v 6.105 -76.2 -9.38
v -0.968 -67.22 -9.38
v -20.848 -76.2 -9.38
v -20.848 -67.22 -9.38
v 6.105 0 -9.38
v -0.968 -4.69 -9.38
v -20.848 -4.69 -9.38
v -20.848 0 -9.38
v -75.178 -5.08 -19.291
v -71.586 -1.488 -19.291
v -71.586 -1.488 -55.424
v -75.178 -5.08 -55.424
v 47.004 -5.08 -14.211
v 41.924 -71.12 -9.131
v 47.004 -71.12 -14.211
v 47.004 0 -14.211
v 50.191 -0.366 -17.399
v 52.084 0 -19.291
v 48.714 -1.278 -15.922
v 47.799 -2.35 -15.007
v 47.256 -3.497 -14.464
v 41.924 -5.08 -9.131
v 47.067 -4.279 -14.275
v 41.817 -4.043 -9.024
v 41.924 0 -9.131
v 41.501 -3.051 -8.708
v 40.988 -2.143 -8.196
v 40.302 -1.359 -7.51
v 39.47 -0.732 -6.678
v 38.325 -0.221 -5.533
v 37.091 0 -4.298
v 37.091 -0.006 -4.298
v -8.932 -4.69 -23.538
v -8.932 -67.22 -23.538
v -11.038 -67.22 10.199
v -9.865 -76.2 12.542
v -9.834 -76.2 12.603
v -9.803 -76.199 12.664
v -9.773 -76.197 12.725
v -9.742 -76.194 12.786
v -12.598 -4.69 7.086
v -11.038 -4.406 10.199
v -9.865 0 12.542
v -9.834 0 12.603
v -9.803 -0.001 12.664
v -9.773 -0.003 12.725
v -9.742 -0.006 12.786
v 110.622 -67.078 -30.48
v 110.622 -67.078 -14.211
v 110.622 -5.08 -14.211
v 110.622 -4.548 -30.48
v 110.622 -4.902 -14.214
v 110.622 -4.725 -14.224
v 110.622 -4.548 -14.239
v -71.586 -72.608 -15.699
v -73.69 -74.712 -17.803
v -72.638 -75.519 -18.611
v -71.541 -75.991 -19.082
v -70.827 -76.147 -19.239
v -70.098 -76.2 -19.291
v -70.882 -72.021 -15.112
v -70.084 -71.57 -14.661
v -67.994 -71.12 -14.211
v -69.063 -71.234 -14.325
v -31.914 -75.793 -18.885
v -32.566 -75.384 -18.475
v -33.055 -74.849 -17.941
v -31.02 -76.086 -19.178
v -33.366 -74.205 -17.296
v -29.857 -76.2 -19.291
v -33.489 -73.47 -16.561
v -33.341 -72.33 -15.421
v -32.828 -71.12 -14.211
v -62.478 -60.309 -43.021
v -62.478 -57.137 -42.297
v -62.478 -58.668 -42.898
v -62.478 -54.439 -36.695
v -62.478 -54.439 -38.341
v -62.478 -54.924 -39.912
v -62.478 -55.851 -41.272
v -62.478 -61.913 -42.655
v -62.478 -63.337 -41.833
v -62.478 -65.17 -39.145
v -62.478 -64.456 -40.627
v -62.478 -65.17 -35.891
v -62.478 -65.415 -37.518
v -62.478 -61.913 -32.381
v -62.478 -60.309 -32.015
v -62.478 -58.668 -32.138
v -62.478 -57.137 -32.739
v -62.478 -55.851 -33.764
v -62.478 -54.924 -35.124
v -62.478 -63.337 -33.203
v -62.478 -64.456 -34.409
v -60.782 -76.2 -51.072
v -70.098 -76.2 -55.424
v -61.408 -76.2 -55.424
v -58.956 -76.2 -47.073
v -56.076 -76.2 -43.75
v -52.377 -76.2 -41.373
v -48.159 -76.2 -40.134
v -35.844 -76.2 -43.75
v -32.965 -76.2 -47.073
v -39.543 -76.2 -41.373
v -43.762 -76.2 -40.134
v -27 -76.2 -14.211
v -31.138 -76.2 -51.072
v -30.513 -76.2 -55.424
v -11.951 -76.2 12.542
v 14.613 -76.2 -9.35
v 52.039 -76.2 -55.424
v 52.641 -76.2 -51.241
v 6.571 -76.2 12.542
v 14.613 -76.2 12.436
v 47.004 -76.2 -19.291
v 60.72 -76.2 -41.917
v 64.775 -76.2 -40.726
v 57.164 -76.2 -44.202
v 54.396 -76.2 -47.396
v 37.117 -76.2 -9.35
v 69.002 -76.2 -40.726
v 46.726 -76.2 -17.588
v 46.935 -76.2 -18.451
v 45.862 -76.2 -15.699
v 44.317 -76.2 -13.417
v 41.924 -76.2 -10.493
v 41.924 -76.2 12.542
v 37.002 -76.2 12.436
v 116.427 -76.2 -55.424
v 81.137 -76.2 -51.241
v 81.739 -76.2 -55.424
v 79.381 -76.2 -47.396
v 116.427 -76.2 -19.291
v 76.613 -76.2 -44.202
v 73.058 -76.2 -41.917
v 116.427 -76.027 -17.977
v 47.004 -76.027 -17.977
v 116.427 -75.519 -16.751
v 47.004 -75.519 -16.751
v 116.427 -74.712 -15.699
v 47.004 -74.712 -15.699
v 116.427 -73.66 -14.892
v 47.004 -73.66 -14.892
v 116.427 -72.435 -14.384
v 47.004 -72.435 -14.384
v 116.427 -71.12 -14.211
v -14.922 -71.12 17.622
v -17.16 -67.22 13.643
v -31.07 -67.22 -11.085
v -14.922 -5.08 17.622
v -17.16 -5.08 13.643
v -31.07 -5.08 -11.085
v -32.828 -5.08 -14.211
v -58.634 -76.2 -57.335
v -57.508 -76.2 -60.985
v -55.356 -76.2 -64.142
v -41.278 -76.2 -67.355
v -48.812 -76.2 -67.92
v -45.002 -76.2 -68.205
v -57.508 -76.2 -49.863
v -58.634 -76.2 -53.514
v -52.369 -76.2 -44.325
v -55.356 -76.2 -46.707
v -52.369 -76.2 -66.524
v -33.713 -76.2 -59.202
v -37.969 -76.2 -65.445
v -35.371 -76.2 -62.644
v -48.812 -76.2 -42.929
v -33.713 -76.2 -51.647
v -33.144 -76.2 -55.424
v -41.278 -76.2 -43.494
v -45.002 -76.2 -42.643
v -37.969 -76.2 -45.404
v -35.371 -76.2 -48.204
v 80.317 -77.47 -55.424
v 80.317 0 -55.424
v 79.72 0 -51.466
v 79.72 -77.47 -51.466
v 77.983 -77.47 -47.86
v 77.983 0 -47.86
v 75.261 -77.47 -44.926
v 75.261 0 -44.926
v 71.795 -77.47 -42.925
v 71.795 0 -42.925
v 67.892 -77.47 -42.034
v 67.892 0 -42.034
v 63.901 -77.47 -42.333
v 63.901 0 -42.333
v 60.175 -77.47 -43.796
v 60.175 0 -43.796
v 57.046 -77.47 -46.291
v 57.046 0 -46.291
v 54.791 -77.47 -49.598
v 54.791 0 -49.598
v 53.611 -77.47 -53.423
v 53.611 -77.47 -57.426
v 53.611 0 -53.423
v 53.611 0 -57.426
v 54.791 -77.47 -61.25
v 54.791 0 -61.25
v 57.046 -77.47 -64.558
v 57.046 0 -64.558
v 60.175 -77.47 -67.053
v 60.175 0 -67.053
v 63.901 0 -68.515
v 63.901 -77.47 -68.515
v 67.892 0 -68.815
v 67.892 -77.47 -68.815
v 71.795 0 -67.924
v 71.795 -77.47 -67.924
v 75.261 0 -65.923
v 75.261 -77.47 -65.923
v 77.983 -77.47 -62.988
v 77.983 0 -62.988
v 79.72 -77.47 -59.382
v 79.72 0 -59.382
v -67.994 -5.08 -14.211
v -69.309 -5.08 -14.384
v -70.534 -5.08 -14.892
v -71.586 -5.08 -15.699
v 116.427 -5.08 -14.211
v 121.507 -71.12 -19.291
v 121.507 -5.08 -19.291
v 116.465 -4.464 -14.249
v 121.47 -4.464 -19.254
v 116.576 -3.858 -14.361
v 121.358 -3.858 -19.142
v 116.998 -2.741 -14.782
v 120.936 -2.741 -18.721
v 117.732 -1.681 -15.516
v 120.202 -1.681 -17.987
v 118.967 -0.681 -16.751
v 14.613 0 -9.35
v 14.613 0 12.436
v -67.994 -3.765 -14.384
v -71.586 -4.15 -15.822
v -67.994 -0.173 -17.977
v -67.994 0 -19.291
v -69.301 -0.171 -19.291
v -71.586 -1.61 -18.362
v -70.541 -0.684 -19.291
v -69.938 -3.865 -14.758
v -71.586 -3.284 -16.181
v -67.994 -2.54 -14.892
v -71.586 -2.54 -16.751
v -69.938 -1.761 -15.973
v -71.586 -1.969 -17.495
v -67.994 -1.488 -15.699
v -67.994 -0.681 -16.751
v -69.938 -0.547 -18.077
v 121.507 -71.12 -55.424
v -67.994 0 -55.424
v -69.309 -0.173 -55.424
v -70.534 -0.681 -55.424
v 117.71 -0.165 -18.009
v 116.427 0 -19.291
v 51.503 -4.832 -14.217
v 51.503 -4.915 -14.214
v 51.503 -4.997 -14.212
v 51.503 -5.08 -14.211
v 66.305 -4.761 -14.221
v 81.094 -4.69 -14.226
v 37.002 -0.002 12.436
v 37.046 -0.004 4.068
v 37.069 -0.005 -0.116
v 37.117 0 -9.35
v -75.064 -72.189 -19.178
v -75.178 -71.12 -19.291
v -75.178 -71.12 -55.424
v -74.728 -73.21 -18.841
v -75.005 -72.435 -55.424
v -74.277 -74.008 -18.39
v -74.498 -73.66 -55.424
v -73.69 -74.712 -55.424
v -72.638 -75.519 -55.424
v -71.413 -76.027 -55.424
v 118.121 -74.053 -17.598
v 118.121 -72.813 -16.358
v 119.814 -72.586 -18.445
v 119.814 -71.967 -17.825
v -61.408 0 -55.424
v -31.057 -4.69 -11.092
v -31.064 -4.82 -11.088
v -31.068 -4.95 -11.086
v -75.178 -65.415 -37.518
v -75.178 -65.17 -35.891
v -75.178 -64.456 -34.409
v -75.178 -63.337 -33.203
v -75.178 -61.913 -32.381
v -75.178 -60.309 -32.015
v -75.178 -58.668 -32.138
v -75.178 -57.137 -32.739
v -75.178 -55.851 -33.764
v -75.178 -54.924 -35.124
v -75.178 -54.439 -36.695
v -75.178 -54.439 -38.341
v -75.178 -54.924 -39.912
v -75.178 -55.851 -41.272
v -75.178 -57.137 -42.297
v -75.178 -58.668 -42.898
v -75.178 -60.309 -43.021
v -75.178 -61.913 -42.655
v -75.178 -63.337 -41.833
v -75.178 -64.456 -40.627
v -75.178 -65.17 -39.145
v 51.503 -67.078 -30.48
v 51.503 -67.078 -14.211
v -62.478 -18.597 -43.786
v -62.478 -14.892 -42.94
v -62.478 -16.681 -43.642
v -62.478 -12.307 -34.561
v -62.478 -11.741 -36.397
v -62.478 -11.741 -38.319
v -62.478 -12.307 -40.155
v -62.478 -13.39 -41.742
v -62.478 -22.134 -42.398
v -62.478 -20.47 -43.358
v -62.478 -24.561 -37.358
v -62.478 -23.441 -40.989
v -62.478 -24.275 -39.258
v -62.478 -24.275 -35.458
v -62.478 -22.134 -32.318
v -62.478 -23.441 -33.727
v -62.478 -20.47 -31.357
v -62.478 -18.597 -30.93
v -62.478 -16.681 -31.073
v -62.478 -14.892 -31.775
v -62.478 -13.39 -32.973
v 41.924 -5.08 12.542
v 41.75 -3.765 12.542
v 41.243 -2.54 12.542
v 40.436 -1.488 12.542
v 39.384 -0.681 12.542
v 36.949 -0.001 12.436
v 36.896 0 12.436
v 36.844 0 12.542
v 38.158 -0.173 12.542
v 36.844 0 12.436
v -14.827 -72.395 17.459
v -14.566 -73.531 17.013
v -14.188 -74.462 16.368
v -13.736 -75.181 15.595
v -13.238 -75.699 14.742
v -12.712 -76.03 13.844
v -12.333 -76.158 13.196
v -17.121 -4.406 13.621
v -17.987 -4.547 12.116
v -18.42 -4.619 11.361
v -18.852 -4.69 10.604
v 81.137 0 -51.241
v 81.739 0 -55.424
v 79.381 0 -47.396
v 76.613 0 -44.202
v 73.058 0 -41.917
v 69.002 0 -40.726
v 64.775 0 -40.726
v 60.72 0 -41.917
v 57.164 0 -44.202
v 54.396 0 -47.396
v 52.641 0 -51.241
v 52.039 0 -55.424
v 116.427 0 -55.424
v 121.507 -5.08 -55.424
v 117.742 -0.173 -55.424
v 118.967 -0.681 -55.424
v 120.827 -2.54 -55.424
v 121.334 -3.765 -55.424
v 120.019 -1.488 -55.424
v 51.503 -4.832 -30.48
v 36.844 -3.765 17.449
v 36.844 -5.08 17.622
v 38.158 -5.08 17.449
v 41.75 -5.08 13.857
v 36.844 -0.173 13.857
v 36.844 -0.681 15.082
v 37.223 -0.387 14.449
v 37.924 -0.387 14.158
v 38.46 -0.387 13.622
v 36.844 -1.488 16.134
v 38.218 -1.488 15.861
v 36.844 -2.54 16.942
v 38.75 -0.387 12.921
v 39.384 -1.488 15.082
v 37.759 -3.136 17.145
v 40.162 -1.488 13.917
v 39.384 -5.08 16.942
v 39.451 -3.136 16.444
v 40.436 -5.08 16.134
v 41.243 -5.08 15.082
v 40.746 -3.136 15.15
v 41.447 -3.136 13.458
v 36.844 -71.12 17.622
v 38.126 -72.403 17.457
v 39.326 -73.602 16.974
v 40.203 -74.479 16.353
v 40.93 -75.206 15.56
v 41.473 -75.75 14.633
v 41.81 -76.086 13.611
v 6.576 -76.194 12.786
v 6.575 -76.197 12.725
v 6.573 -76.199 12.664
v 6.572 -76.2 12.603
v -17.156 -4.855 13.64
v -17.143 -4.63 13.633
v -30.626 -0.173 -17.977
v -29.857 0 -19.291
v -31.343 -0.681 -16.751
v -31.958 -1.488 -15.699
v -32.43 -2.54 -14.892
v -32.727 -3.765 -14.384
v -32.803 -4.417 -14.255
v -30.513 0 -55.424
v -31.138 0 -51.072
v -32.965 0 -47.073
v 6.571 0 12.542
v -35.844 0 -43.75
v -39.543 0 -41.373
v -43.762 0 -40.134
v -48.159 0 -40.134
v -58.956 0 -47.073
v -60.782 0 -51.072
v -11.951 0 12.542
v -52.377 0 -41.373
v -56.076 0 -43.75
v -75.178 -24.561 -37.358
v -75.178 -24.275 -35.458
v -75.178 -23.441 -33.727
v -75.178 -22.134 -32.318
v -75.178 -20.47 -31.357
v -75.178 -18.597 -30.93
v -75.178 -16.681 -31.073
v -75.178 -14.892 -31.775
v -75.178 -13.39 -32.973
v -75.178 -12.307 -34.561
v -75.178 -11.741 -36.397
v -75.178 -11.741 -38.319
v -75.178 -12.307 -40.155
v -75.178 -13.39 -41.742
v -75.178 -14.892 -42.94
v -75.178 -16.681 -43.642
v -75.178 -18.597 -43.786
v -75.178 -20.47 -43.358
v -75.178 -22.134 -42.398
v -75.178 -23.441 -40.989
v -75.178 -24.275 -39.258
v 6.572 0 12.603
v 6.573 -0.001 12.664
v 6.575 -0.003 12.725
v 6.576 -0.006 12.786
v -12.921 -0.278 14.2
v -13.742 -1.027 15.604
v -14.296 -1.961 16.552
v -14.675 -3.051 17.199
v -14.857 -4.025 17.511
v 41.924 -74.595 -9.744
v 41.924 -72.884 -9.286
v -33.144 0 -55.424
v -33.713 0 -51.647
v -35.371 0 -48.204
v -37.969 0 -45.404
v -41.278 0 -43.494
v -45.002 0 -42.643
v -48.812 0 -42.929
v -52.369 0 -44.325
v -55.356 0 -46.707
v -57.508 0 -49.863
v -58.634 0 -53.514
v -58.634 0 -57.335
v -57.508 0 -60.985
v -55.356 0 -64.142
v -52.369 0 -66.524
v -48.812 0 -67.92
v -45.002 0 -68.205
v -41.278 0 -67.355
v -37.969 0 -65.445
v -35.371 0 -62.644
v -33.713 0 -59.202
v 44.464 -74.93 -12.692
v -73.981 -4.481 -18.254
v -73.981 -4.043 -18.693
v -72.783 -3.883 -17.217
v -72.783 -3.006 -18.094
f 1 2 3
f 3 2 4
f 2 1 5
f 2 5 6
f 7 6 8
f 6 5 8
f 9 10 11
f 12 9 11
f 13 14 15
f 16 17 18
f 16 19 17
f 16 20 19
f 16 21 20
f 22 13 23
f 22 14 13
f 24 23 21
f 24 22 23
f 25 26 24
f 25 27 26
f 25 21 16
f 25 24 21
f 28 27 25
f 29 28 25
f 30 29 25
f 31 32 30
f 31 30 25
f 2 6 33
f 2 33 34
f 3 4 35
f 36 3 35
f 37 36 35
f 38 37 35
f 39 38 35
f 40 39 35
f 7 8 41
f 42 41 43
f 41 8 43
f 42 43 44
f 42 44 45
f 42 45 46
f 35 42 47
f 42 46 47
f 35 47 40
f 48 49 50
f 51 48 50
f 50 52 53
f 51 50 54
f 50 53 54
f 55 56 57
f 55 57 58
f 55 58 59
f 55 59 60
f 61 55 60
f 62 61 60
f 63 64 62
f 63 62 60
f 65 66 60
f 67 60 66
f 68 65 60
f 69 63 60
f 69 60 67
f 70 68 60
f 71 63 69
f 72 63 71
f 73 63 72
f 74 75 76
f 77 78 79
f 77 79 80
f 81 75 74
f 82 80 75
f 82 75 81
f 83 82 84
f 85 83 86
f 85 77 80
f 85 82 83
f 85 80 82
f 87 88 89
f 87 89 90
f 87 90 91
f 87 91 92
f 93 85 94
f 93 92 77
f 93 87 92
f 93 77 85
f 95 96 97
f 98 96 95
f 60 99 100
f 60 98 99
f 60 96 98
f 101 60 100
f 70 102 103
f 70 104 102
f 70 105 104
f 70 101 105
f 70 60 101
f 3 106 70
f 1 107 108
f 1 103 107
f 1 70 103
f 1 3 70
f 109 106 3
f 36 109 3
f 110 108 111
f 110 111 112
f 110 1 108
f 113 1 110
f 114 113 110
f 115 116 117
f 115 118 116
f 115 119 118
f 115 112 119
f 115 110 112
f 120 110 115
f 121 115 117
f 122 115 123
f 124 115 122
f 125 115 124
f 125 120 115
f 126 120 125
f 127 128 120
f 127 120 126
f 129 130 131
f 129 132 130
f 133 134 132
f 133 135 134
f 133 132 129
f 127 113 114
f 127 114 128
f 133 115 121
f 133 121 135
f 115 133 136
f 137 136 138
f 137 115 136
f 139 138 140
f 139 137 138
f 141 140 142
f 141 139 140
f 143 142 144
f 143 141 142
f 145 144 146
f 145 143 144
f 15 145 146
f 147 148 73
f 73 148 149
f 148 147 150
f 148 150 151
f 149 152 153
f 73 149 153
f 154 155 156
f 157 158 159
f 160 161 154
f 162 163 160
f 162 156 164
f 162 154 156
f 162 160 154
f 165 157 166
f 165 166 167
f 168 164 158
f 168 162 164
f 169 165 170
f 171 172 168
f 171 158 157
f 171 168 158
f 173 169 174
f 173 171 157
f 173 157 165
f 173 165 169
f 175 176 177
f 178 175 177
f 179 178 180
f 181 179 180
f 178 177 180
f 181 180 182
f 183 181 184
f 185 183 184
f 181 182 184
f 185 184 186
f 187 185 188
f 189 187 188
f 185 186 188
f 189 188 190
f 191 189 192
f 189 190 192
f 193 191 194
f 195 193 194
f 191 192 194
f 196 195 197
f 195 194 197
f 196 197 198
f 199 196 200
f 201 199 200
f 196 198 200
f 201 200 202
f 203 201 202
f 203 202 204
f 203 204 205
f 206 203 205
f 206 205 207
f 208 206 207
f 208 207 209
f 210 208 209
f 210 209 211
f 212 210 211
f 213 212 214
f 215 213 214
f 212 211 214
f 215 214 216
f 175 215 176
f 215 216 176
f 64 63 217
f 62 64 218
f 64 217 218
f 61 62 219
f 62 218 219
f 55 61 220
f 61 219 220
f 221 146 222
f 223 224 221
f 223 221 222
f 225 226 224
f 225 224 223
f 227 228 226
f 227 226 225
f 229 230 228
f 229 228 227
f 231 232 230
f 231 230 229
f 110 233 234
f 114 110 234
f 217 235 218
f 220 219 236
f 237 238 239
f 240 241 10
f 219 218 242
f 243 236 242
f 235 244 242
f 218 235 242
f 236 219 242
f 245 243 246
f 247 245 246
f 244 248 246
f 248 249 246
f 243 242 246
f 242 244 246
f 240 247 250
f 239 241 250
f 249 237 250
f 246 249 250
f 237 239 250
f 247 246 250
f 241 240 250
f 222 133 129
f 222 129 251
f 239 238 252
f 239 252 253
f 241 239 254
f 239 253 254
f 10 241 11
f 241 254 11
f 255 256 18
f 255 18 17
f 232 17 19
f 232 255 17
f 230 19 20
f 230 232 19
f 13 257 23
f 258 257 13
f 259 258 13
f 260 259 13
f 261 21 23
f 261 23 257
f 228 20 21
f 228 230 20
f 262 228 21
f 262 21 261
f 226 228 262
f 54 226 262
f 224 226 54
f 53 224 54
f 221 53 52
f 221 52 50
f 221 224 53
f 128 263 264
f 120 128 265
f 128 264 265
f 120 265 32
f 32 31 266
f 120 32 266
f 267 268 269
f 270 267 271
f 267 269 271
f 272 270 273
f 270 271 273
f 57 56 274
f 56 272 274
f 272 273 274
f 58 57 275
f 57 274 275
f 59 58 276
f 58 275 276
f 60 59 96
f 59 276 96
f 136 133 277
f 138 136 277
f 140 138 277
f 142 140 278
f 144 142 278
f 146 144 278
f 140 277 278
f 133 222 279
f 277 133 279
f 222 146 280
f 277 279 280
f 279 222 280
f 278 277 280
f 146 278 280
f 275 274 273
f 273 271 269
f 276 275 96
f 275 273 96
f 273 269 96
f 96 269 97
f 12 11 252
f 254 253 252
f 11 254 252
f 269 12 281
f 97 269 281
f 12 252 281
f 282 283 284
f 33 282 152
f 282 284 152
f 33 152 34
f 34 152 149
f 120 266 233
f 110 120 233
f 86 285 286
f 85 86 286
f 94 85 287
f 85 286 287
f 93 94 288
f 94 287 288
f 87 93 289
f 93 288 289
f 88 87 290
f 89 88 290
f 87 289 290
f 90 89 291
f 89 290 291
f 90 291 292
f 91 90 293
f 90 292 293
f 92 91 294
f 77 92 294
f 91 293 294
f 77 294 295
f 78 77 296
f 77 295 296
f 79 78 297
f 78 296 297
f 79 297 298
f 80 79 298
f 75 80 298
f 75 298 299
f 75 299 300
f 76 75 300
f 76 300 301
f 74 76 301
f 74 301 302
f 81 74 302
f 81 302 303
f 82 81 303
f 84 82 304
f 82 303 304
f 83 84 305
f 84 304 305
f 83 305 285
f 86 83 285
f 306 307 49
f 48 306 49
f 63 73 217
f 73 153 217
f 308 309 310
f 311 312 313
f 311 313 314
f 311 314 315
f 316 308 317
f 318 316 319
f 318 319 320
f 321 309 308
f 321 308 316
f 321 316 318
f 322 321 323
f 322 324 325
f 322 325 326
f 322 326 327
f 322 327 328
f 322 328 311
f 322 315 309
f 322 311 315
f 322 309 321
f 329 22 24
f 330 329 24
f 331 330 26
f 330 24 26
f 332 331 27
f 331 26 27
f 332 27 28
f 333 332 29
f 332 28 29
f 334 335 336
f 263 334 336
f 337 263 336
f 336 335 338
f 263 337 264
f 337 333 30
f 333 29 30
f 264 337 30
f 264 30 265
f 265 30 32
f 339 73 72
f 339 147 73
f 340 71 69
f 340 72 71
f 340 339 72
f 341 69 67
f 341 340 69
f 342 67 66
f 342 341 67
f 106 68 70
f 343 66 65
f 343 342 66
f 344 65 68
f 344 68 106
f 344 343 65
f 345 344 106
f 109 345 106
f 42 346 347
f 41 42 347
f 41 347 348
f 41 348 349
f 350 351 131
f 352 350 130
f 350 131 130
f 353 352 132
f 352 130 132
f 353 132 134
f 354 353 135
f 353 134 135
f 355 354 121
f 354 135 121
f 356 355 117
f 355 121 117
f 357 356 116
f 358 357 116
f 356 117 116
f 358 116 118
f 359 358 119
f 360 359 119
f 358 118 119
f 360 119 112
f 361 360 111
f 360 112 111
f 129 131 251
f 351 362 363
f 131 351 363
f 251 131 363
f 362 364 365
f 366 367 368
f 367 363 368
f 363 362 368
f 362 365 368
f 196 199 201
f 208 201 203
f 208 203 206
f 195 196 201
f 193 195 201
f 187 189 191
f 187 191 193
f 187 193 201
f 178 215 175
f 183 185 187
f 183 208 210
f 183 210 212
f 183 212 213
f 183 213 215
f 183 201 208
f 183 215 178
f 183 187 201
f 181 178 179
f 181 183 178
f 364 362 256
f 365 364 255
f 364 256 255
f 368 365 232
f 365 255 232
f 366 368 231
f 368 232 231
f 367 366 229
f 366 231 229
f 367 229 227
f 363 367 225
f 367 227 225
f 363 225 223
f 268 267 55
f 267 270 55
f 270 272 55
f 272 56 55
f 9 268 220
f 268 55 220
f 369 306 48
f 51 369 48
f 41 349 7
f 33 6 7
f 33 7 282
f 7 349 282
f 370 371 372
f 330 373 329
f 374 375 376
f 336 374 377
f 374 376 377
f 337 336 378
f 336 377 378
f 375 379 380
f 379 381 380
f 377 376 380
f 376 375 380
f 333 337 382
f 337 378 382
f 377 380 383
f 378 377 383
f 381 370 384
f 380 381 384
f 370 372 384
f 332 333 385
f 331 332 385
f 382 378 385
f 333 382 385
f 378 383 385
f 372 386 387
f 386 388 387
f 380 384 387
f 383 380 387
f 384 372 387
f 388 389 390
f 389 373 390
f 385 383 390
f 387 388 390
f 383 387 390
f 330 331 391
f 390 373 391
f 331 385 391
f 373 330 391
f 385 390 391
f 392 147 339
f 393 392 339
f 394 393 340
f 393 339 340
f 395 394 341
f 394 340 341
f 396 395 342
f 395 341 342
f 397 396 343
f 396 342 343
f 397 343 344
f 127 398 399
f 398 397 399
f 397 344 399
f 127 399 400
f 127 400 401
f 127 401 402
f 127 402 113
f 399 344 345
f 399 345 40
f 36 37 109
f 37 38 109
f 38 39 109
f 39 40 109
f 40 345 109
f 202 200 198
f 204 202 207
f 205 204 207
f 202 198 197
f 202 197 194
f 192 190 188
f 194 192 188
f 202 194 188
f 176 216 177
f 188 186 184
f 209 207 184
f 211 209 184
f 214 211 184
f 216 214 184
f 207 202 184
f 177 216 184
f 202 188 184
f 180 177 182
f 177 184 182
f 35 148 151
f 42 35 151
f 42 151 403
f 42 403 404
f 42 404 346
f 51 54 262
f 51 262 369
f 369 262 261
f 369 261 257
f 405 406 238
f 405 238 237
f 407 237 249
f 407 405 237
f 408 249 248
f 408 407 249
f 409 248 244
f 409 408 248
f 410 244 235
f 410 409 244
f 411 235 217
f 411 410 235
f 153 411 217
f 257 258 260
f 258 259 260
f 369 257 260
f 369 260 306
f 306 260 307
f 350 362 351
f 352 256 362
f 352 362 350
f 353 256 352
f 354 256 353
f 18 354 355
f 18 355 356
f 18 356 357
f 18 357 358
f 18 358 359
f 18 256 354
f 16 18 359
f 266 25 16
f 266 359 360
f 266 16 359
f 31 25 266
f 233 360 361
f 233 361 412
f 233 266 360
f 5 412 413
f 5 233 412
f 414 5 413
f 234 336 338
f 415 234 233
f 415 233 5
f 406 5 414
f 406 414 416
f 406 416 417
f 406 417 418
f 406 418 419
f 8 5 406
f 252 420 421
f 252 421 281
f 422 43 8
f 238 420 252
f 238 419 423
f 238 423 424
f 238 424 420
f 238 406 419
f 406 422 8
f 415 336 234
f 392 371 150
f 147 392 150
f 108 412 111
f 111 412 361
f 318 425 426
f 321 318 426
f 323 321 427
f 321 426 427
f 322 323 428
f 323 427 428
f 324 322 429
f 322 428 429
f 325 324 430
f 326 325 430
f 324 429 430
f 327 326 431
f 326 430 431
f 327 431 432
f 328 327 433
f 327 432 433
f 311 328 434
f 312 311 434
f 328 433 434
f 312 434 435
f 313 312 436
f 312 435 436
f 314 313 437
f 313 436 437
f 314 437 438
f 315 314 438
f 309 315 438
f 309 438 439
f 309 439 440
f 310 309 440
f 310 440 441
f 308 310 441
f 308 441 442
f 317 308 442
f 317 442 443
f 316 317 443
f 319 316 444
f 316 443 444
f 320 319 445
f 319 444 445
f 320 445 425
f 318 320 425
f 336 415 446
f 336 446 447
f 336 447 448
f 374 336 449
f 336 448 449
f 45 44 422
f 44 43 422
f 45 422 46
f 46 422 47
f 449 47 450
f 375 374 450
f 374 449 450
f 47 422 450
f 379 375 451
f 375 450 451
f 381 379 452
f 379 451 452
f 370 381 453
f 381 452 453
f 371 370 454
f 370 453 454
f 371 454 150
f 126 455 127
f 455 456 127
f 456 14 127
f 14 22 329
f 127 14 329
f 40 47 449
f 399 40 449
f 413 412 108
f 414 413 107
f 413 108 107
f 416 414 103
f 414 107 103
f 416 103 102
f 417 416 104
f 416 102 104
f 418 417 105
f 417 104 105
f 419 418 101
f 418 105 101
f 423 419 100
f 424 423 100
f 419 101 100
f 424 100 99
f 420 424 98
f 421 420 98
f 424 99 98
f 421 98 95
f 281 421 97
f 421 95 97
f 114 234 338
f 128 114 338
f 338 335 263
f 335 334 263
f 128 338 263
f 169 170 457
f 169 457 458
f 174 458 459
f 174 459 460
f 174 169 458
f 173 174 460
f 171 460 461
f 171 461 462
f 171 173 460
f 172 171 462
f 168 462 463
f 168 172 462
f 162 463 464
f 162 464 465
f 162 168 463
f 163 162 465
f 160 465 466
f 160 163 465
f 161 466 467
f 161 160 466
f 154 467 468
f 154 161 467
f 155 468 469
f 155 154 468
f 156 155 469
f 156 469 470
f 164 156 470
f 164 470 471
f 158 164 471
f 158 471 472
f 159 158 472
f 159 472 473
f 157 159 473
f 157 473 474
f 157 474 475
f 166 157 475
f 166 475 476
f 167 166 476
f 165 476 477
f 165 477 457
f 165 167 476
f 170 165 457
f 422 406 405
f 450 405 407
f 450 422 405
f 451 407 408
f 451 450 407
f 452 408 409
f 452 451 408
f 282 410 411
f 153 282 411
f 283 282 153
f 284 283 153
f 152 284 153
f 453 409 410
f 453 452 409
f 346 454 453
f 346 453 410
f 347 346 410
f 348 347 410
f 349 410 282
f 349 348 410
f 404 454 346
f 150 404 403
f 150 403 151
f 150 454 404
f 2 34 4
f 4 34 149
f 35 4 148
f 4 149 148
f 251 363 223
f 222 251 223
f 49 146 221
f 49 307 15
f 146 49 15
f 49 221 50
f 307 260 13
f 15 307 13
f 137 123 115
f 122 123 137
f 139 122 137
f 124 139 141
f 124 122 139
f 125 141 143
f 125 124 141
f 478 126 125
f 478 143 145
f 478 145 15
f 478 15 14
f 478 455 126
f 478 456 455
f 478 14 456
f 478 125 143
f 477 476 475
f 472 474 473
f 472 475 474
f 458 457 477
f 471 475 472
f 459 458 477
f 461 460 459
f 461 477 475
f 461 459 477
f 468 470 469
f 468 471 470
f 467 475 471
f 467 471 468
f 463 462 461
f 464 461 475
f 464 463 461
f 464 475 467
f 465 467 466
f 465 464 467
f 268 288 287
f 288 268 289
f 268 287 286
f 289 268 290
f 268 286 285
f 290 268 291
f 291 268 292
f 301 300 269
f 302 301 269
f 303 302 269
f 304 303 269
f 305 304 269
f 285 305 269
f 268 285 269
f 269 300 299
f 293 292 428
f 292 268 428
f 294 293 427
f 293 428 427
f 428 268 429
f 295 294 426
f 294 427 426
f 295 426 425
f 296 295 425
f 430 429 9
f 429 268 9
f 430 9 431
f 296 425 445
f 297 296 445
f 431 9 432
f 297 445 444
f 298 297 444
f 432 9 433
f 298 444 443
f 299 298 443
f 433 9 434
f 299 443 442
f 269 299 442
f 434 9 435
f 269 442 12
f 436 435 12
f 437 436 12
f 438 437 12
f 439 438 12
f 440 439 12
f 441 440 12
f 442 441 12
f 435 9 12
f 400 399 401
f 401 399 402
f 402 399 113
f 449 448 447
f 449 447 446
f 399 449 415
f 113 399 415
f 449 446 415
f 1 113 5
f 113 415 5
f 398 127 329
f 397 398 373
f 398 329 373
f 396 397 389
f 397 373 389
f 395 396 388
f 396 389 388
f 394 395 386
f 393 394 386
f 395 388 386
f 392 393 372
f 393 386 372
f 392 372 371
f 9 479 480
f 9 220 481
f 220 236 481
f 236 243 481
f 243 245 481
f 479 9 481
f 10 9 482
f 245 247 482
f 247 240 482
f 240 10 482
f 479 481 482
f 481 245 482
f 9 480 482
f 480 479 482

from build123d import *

# Parameters (mm, degrees)
F1_DEPTH      = 76.2
F2_T1_DEPTH   = 82.2454749882
F2_T3_DEPTH   = 101.6
F2_T8_DEPTH   = 61.9240448763
F3_SIZE       = 5.08
F4_R          = 5.08
F5_R          = 5.08
F6_T1_DEPTH   = 71.12
F6_T6_ANGLE   = 237.4057717794
F6_T8_DEPTH   = 49.1971181071
F6_T10_DEPTH  = 84.1841495789
F6_T13_ANGLE  = 90
F8_DEPTH      = 30.48
F10_DEPTH     = 25.4
F12_R         = 15.4477433976
F12_R_2       = 12.8167131571
F13_DEPTH     = 76.2
F14_R         = 14.8497475739
F15_DEPTH     = 76.2
F16_DEPTH     = 76.2
F17_DEPTH     = 77.47
F18_T1_DEPTH  = 64.4654749882
F18_T6_DEPTH  = 61.9240448763
F18_T11_DEPTH = 67.7498786986
F18_T14_ANGLE = 90.0000000017
F18_T18_DEPTH = 34.3734642797
F18_T24_DEPTH = 67.7498786986
F18_T28_DEPTH = 61.9240448763
F19_SIZE      = 5.07999
F20_T4_DEPTH  = 94.8236597681
F21_R         = 5.08
F22_R         = 5.08
F23_R         = 6.4459683432
F24_DEPTH     = 12.7
F25_R         = 5.5186924219
F26_DEPTH     = 12.7


# Not quite as in the source:
# - a fillet or chamfer that OpenCascade refuses, or shapes differently, is made with other operations: its cross-section is extruded or revolved along the edge and cut away or added
# - a fillet or chamfer is up to 0.001 mm smaller than in the source, because OpenCascade refuses the exact size
# - a feature names something its author has since deleted; it is built from what else it names
# - the program builds the solid bodies; features that only make, move or delete a surface that nothing else refers to are left out


with BuildPart() as f1:
    # F0 (on Front) → F1 (new body)
    with BuildSketch(Plane.XZ):
        with BuildLine():
            Line((-66.651314497, -14.2113678157), (-75.1781389117, -14.2113678157))
            Line((-75.1781389117, -14.2113678157), (-75.1781389117, -55.424336344))
            Line((-75.1781389117, -55.424336344), (-58.9820734658, -55.424336344))
            ThreePointArc((-58.9820734658, -55.424336344), (-45.9602549672, -42.4025178455), (-32.9384364687, -55.424336344))
            Line((-32.9384364687, -55.424336344), (53.461017087, -55.424336344))
            ThreePointArc((53.461017087, -55.424336344), (66.8888092041, -41.9965442269), (80.3166013212, -55.424336344))
            Line((80.3166013212, -55.424336344), (121.5071976185, -55.424336344))
            Line((121.5071976185, -55.424336344), (121.5071976185, -37.5180095434))
            Line((121.5071976185, -37.5180095434), (121.5071976185, -14.2113678157))
            Line((121.5071976185, -14.2113678157), (41.9235378504, -14.2113678157))
            Line((41.9235378504, -14.2113678157), (-32.8282602131, -14.2113678157))
            Line((-32.8282602131, -14.2113678157), (-66.651314497, -14.2113678157))
        make_face()
        Polygon((-14.9219371378, 17.622096464), (-32.8282602131, -14.2113678157), (41.9235378504, -14.2113678157), (41.9235378504, 17.622096464), align=None)
        Polygon((-20.8475716081, -9.3802222982), (-9.7422166161, 12.7864088863), (6.5759164281, 12.7864088863), (6.1049396172, -9.3802222982), align=None, mode=Mode.SUBTRACT)
        Polygon((14.6131906658, -9.3496078625), (14.6131906658, 12.4364411458), (37.0022393763, 12.4364411458), (37.1173098683, -9.3496078625), align=None, mode=Mode.SUBTRACT)
        with BuildLine():
            ThreePointArc((-32.9384364687, -55.424336344), (-45.9602549672, -42.4025178455), (-58.9820734658, -55.424336344))
            Line((-58.9820734658, -55.424336344), (-32.9384364687, -55.424336344))
        make_face()
        with BuildLine():
            Line((-32.9384364687, -55.424336344), (-58.9820734658, -55.424336344))
            ThreePointArc((-58.9820734658, -55.424336344), (-45.9602549672, -68.4461548426), (-32.9384364687, -55.424336344))
        make_face()
        with BuildLine():
            ThreePointArc((80.3166013212, -55.424336344), (66.8888092041, -41.9965442269), (53.461017087, -55.424336344))
            Line((53.461017087, -55.424336344), (80.3166013212, -55.424336344))
        make_face()
        with BuildLine():
            Line((80.3166013212, -55.424336344), (53.461017087, -55.424336344))
            ThreePointArc((53.461017087, -55.424336344), (66.8888092041, -68.8521284611), (80.3166013212, -55.424336344))
        make_face()
    extrude(amount=F1_DEPTH)

    # F2: fillet of radius 5.08 on 3 edges, made by hand

    # F2_s2 → F2_t1 (cut)
    with BuildSketch(Plane.YZ.offset(-27.6219371378)):
        with BuildLine():
            ThreePointArc((-71.12, 17.622096464), (-74.7121024484, 16.1341989125), (-76.2, 12.542096464))
            Line((-76.2, 12.542096464), (-76.2, 17.622096464))
            Line((-76.2, 17.622096464), (-71.12, 17.622096464))
        make_face()
    extrude(amount=F2_T1_DEPTH, mode=Mode.SUBTRACT)

    # F2_s4 → F2_t3 (cut)
    with BuildSketch(Plane.XZ.offset(-12.7)):
        with BuildLine():
            ThreePointArc((41.9235378504, 12.542096464), (40.4356402988, 16.1341989125), (36.8435378504, 17.622096464))
            Line((36.8435378504, 17.622096464), (41.9235378504, 17.622096464))
            Line((41.9235378504, 17.622096464), (41.9235378504, 12.542096464))
        make_face()
    extrude(amount=F2_T3_DEPTH, mode=Mode.SUBTRACT)


with BuildPart() as f2_tool6:
    # F2_s7 → F2_t8 (new body)
    with BuildSketch(Plane(origin=(10.1696558671, 0, 18.0793887958), x_dir=(0, 1, 0), z_dir=(-0.4902612275, 0, -0.8715755439))):
        with BuildLine():
            ThreePointArc((-71.12, -21.6450261215), (-74.7121024484, -20.1571285699), (-76.2, -16.5650261215))
            Line((-76.2, -16.5650261215), (-76.2, -21.6450261215))
            Line((-76.2, -21.6450261215), (-71.12, -21.6450261215))
        make_face()
    extrude(amount=F2_T8_DEPTH)

    split(bisect_by=Plane.XY.offset(-14.2113678157), keep=Keep.TOP)


with BuildPart() as f1_1:
    add(f1.part)

    # F2_t5: cut F2_tool6
    add(f2_tool6.part, mode=Mode.SUBTRACT)

    # F3
    f3_edges = [f1_1.edges().sort_by_distance(p)[0] for p in [
        (-51.088937, -76.2, -14.211368),
    ]]
    chamfer(f3_edges, length=F3_SIZE)

    # F4
    f4_edges = [f1_1.edges().sort_by_distance(p)[0] for p in [
        (-75.178139, -76.2, -37.357852),
    ]]
    fillet(f4_edges, radius=F4_R)

    # F5
    f5_edges = [f1_1.edges().sort_by_distance(p)[0] for p in [
        (81.715368, -76.2, -14.211368),
    ]]
    fillet(f5_edges, radius=F5_R)

    # F6: chamfer of 5.08 on 4 edges, made by hand

    # F6_s2 → F6_t1 (join)
    with BuildSketch(Plane.XZ):
        Polygon((41.9235378504, -9.1313678157), (47.0035378504, -14.2113678157), (41.9235378504, -14.2113678157), align=None)
    extrude(amount=F6_T1_DEPTH)


with BuildPart() as f6_tool4:
    # F6_s5 → F6_t6 (revolve)
    with BuildSketch(Plane(origin=(0, -29.3930998832, -45.970911519), x_dir=(1, 0, 0), z_dir=(0, 0.5386859165, 0.8425066666))):
        Polygon((47.0035378504, -44.447085979), (41.9235378504, -39.367085979), (41.9235378504, -44.447085979), align=None)
    revolve(axis=Axis((41.9235378504, -71.12, -19.2913678157), (-1, 0, 0)), revolution_arc=F6_T6_ANGLE)

    split(bisect_by=Plane.XZ.offset(76.2), keep=Keep.BOTTOM)


with BuildPart() as f1_2:
    add(f1_1.part)

    # F6_t3: union F6_tool4
    add(f6_tool4.part)

    # F6_s9 → F6_t8 (cut)
    with BuildSketch(Plane.XY.offset(-68.4884859229)):
        Polygon((116.4271976185, -76.2), (121.5071976185, -71.12), (121.5071976185, -76.2), align=None)
    extrude(amount=F6_T8_DEPTH, mode=Mode.SUBTRACT)

    # F6_s11 → F6_t10 (cut)
    with BuildSketch(Plane.XZ.offset(-13.0641495789)):
        Polygon((116.4271976185, -14.2113678157), (121.5071976185, -19.2913678157), (121.5071976185, -14.2113678157), align=None)
    extrude(amount=F6_T10_DEPTH, mode=Mode.SUBTRACT)

    # F6_s12 → F6_t13 (revolve, cut)
    with BuildSketch(Plane.XY.offset(-19.2913678157)):
        Polygon((116.4271976185, -76.2), (121.5071976185, -71.12), (121.5071976185, -76.2), align=None)
    revolve(axis=Axis((121.5071976185, -71.12, -19.2913678157), (-1, 0, 0)), revolution_arc=F6_T13_ANGLE, mode=Mode.SUBTRACT)

    # F7 (on Top) → F8 (cut)
    with BuildSketch(Plane.XY):
        Polygon((110.6219664216, -4.5476378873), (51.502674818, -4.8318649642), (51.502674818, -67.0776590705), (110.6219664216, -67.0776590705), align=None)
    extrude(amount=-F8_DEPTH, mode=Mode.SUBTRACT)

    # F9 (on face) → F10 (cut)
    with BuildSketch(Plane(origin=(-18.8652754153, 0, 10.6117170762), x_dir=(0, -1, 0), z_dir=(-0.8715755439, 0, 0.4902612275))):
        Polygon((4.4055245817, 3.4778357949), (4.6897507273, 0), (4.6897507273, -24.8935203999), (67.2197714448, -24.8935203999), (67.2197714448, 3.4778357949), align=None)
    extrude(amount=-F10_DEPTH, mode=Mode.SUBTRACT)

    # F12 (on face) → F13 (cut)
    with BuildSketch(Plane.XZ.offset(76.2)):
        with Locations((-45.9602549672, -55.424336344)):
            Circle(F12_R)
        with Locations((-45.9602549672, -55.424336344)):
            Circle(F12_R_2, mode=Mode.SUBTRACT)
    extrude(amount=-F13_DEPTH, mode=Mode.SUBTRACT)

    # F14 (on face) → F15 (cut)
    with BuildSketch(Plane.XZ.offset(76.2)):
        with Locations((66.8888092041, -55.424336344)):
            Circle(F14_R)
    extrude(amount=-F15_DEPTH, mode=Mode.SUBTRACT)

    # F14 (on face) → F16 (cut)
    with BuildSketch(Plane.XZ.offset(76.2)):
        with Locations((66.8888092041, -55.424336344)):
            Circle(F14_R)
    extrude(amount=-F16_DEPTH, mode=Mode.SUBTRACT)

    # F18: fillet of radius 5.08 on 3 edges, made by hand

    # F18_s2 → F18_t1 (cut)
    with BuildSketch(Plane.YZ.offset(-27.6219371378)):
        with BuildLine():
            ThreePointArc((0, 12.542096464), (-1.4878975516, 16.1341989125), (-5.08, 17.622096464))
            Line((-5.08, 17.622096464), (0, 17.622096464))
            Line((0, 17.622096464), (0, 12.542096464))
        make_face()
    extrude(amount=F18_T1_DEPTH, mode=Mode.SUBTRACT)


with BuildPart() as f17:
    # F0 (on Front) → F17 (new body)
    with BuildSketch(Plane.XZ):
        with BuildLine():
            Line((80.3166013212, -55.424336344), (53.461017087, -55.424336344))
            ThreePointArc((53.461017087, -55.424336344), (66.8888092041, -68.8521284611), (80.3166013212, -55.424336344))
        make_face()
        with BuildLine():
            ThreePointArc((80.3166013212, -55.424336344), (66.8888092041, -41.9965442269), (53.461017087, -55.424336344))
            Line((53.461017087, -55.424336344), (80.3166013212, -55.424336344))
        make_face()
    extrude(amount=F17_DEPTH)


with BuildPart() as f18_tool4:
    # F18_s5 → F18_t6 (new body)
    with BuildSketch(Plane(origin=(10.1696558671, 0, 18.0793887958), x_dir=(0, 1, 0), z_dir=(-0.4902612275, 0, -0.8715755439))):
        with BuildLine():
            ThreePointArc((0, -16.5650261215), (-1.4878975516, -20.1571285699), (-5.08, -21.6450261215))
            Line((-5.08, -21.6450261215), (0, -21.6450261215))
            Line((0, -21.6450261215), (0, -16.5650261215))
        make_face()
    extrude(amount=F18_T6_DEPTH)

    split(bisect_by=Plane.XY.offset(-14.2113678157), keep=Keep.TOP)


with BuildPart() as f1_3:
    add(f1_2.part)

    # F18_t3: cut F18_tool4
    add(f18_tool4.part, mode=Mode.SUBTRACT)


with BuildPart() as f18_tool9:
    # F18_s10 → F18_t11 (new body)
    with BuildSketch(Plane.YZ.offset(-20.1282602131)):
        with BuildLine():
            ThreePointArc((0, -19.2913678157), (-1.4878975516, -15.6992653673), (-5.08, -14.2113678157))
            Line((-5.08, -14.2113678157), (0, -14.2113678157))
            Line((0, -14.2113678157), (0, -19.2913678157))
        make_face()
    extrude(amount=-F18_T11_DEPTH)

    split(bisect_by=Plane(origin=(-18.8652754153, 0, 10.6117170762), x_dir=(0, 1, 0), z_dir=(-0.8715755439, 0, 0.4902612275)), keep=Keep.TOP)


with BuildPart() as f1_4:
    add(f1_3.part)

    # F18_t8: cut F18_tool9
    add(f18_tool9.part, mode=Mode.SUBTRACT)

    # F18_s13 → F18_t14 (revolve, cut)
    with BuildSketch(Plane.YZ.offset(36.8435378505)):
        with BuildLine():
            ThreePointArc((0, 12.542096464), (-1.4878975516, 16.1341989124), (-5.08, 17.622096464))
            Line((-5.08, 17.622096464), (0, 17.622096464))
            Line((0, 17.622096464), (0, 12.542096464))
        make_face()
    revolve(axis=Axis((36.8435378505, 0, 12.5420964641), (0, 1, 0)), revolution_arc=F18_T14_ANGLE, mode=Mode.SUBTRACT)


with BuildPart() as f18_tool16:
    # F18_s17 → F18_t18 (new body)
    with BuildSketch(Plane.XY.offset(-21.8313678157)):
        with BuildLine():
            ThreePointArc((41.9235378504, -5.08), (40.4356402988, -1.4878975516), (36.8435378504, 0))
            Line((36.8435378504, 0), (41.9235378504, 0))
            Line((41.9235378504, 0), (41.9235378504, -5.08))
        make_face()
    extrude(amount=F18_T18_DEPTH)

    split(bisect_by=Plane(origin=(16.3960850174, 0, 16.3960850174), x_dir=(0, 1, 0), z_dir=(0.7071067812, 0, 0.7071067812)), keep=Keep.TOP)


with BuildPart() as f1_5:
    add(f1_4.part)

    # F18_t15: cut F18_tool16
    add(f18_tool16.part, mode=Mode.SUBTRACT)


with BuildPart() as f18_tool22:
    # F18_s23 → F18_t24 (new body)
    with BuildSketch(Plane.YZ.offset(-20.1282602131)):
        with BuildLine():
            ThreePointArc((0, -19.2913678157), (-1.4878975516, -15.6992653673), (-5.08, -14.2113678157))
            Line((-5.08, -14.2113678157), (0, -14.2113678157))
            Line((0, -14.2113678157), (0, -19.2913678157))
        make_face()
    extrude(amount=-F18_T24_DEPTH)

    split(bisect_by=Plane(origin=(-18.8652754153, 0, 10.6117170762), x_dir=(0, 1, 0), z_dir=(0.8715755439, 0, -0.4902612275)), keep=Keep.TOP)


with BuildPart() as f18_tool26:
    # F18_s27 → F18_t28 (new body)
    with BuildSketch(Plane(origin=(10.1696558671, 0, 18.0793887958), x_dir=(0, 1, 0), z_dir=(-0.4902612275, 0, -0.8715755439))):
        with BuildLine():
            ThreePointArc((0, -16.5650261215), (-1.4878975516, -20.1571285699), (-5.08, -21.6450261215))
            Line((-5.08, -21.6450261215), (0, -21.6450261215))
            Line((0, -21.6450261215), (0, -16.5650261215))
        make_face()
    extrude(amount=F18_T28_DEPTH)

    split(bisect_by=Plane.XY.offset(-14.2113678157), keep=Keep.BOTTOM)


with BuildPart() as f18_tool22_1:
    add(f18_tool22.part)

    # F18_t30: intersect F18_tool26
    add(f18_tool26.part, mode=Mode.INTERSECT)


with BuildPart() as f1_6:
    add(f1_5.part)

    # F18_t20: cut F18_tool22
    add(f18_tool22_1.part, mode=Mode.SUBTRACT)

    # F19 (size 5.08 in the source; OpenCascade refuses exactly that, so slightly less here)
    f19_edges = [f1_6.edges().sort_by_distance(p)[0] for p in [
        (-75.178139, 0, -37.357852),
    ]]
    chamfer(f19_edges, length=F19_SIZE)

    # F20: fillet of radius 5.08 on 2 edges, made by hand


with BuildPart() as f20_tool2:
    # F20_s3 → F20_t4 (new body)
    with BuildSketch(Plane.YZ.offset(129.1271976185)):
        with BuildLine():
            ThreePointArc((0, -19.2913678157), (-1.4878975516, -15.6992653673), (-5.08, -14.2113678157))
            Line((-5.08, -14.2113678157), (0, -14.2113678157))
            Line((0, -14.2113678157), (0, -19.2913678157))
        make_face()
    extrude(amount=-F20_T4_DEPTH)

    split(bisect_by=Plane(origin=(16.3960850173, 0, 16.3960850173), x_dir=(0, 1, 0), z_dir=(0.7071067812, 0, 0.7071067812)), keep=Keep.TOP)


with BuildPart() as f1_7:
    add(f1_6.part)

    # F20_t1: cut F20_tool2
    add(f20_tool2.part, mode=Mode.SUBTRACT)

    # F21
    f21_edges = [f1_7.edges().sort_by_distance(p)[0] for p in [
        (121.507198, 0, -37.357852),
    ]]
    fillet(f21_edges, radius=F21_R)

    # F22
    f22_edges = [f1_7.edges().sort_by_distance(p)[0] for p in [
        (-70.098149, 0, -37.357852),
        (-70.098149, -1.487898, -15.699265),
        (-70.098149, -38.1, -14.211368),
    ]]
    fillet(f22_edges, radius=F22_R)

    # F23 (on face) → F24 (cut)
    with BuildSketch(Plane(origin=(-75.1781389117, 0, 0), x_dir=(0, -1, 0), z_dir=(-1, 0, 0))):
        with Locations((18.1149821728, -37.3578520799)):
            Circle(F23_R)
    extrude(amount=-F24_DEPTH, mode=Mode.SUBTRACT)

    # F25 (on face) → F26 (cut)
    with BuildSketch(Plane(origin=(-75.1781389117, 0, 0), x_dir=(0, -1, 0), z_dir=(-1, 0, 0))):
        with Locations((59.896402061, -37.5180095434)):
            Circle(F25_R)
    extrude(amount=-F26_DEPTH, mode=Mode.SUBTRACT)


solid = Compound([f17.part, f1_7.part])
